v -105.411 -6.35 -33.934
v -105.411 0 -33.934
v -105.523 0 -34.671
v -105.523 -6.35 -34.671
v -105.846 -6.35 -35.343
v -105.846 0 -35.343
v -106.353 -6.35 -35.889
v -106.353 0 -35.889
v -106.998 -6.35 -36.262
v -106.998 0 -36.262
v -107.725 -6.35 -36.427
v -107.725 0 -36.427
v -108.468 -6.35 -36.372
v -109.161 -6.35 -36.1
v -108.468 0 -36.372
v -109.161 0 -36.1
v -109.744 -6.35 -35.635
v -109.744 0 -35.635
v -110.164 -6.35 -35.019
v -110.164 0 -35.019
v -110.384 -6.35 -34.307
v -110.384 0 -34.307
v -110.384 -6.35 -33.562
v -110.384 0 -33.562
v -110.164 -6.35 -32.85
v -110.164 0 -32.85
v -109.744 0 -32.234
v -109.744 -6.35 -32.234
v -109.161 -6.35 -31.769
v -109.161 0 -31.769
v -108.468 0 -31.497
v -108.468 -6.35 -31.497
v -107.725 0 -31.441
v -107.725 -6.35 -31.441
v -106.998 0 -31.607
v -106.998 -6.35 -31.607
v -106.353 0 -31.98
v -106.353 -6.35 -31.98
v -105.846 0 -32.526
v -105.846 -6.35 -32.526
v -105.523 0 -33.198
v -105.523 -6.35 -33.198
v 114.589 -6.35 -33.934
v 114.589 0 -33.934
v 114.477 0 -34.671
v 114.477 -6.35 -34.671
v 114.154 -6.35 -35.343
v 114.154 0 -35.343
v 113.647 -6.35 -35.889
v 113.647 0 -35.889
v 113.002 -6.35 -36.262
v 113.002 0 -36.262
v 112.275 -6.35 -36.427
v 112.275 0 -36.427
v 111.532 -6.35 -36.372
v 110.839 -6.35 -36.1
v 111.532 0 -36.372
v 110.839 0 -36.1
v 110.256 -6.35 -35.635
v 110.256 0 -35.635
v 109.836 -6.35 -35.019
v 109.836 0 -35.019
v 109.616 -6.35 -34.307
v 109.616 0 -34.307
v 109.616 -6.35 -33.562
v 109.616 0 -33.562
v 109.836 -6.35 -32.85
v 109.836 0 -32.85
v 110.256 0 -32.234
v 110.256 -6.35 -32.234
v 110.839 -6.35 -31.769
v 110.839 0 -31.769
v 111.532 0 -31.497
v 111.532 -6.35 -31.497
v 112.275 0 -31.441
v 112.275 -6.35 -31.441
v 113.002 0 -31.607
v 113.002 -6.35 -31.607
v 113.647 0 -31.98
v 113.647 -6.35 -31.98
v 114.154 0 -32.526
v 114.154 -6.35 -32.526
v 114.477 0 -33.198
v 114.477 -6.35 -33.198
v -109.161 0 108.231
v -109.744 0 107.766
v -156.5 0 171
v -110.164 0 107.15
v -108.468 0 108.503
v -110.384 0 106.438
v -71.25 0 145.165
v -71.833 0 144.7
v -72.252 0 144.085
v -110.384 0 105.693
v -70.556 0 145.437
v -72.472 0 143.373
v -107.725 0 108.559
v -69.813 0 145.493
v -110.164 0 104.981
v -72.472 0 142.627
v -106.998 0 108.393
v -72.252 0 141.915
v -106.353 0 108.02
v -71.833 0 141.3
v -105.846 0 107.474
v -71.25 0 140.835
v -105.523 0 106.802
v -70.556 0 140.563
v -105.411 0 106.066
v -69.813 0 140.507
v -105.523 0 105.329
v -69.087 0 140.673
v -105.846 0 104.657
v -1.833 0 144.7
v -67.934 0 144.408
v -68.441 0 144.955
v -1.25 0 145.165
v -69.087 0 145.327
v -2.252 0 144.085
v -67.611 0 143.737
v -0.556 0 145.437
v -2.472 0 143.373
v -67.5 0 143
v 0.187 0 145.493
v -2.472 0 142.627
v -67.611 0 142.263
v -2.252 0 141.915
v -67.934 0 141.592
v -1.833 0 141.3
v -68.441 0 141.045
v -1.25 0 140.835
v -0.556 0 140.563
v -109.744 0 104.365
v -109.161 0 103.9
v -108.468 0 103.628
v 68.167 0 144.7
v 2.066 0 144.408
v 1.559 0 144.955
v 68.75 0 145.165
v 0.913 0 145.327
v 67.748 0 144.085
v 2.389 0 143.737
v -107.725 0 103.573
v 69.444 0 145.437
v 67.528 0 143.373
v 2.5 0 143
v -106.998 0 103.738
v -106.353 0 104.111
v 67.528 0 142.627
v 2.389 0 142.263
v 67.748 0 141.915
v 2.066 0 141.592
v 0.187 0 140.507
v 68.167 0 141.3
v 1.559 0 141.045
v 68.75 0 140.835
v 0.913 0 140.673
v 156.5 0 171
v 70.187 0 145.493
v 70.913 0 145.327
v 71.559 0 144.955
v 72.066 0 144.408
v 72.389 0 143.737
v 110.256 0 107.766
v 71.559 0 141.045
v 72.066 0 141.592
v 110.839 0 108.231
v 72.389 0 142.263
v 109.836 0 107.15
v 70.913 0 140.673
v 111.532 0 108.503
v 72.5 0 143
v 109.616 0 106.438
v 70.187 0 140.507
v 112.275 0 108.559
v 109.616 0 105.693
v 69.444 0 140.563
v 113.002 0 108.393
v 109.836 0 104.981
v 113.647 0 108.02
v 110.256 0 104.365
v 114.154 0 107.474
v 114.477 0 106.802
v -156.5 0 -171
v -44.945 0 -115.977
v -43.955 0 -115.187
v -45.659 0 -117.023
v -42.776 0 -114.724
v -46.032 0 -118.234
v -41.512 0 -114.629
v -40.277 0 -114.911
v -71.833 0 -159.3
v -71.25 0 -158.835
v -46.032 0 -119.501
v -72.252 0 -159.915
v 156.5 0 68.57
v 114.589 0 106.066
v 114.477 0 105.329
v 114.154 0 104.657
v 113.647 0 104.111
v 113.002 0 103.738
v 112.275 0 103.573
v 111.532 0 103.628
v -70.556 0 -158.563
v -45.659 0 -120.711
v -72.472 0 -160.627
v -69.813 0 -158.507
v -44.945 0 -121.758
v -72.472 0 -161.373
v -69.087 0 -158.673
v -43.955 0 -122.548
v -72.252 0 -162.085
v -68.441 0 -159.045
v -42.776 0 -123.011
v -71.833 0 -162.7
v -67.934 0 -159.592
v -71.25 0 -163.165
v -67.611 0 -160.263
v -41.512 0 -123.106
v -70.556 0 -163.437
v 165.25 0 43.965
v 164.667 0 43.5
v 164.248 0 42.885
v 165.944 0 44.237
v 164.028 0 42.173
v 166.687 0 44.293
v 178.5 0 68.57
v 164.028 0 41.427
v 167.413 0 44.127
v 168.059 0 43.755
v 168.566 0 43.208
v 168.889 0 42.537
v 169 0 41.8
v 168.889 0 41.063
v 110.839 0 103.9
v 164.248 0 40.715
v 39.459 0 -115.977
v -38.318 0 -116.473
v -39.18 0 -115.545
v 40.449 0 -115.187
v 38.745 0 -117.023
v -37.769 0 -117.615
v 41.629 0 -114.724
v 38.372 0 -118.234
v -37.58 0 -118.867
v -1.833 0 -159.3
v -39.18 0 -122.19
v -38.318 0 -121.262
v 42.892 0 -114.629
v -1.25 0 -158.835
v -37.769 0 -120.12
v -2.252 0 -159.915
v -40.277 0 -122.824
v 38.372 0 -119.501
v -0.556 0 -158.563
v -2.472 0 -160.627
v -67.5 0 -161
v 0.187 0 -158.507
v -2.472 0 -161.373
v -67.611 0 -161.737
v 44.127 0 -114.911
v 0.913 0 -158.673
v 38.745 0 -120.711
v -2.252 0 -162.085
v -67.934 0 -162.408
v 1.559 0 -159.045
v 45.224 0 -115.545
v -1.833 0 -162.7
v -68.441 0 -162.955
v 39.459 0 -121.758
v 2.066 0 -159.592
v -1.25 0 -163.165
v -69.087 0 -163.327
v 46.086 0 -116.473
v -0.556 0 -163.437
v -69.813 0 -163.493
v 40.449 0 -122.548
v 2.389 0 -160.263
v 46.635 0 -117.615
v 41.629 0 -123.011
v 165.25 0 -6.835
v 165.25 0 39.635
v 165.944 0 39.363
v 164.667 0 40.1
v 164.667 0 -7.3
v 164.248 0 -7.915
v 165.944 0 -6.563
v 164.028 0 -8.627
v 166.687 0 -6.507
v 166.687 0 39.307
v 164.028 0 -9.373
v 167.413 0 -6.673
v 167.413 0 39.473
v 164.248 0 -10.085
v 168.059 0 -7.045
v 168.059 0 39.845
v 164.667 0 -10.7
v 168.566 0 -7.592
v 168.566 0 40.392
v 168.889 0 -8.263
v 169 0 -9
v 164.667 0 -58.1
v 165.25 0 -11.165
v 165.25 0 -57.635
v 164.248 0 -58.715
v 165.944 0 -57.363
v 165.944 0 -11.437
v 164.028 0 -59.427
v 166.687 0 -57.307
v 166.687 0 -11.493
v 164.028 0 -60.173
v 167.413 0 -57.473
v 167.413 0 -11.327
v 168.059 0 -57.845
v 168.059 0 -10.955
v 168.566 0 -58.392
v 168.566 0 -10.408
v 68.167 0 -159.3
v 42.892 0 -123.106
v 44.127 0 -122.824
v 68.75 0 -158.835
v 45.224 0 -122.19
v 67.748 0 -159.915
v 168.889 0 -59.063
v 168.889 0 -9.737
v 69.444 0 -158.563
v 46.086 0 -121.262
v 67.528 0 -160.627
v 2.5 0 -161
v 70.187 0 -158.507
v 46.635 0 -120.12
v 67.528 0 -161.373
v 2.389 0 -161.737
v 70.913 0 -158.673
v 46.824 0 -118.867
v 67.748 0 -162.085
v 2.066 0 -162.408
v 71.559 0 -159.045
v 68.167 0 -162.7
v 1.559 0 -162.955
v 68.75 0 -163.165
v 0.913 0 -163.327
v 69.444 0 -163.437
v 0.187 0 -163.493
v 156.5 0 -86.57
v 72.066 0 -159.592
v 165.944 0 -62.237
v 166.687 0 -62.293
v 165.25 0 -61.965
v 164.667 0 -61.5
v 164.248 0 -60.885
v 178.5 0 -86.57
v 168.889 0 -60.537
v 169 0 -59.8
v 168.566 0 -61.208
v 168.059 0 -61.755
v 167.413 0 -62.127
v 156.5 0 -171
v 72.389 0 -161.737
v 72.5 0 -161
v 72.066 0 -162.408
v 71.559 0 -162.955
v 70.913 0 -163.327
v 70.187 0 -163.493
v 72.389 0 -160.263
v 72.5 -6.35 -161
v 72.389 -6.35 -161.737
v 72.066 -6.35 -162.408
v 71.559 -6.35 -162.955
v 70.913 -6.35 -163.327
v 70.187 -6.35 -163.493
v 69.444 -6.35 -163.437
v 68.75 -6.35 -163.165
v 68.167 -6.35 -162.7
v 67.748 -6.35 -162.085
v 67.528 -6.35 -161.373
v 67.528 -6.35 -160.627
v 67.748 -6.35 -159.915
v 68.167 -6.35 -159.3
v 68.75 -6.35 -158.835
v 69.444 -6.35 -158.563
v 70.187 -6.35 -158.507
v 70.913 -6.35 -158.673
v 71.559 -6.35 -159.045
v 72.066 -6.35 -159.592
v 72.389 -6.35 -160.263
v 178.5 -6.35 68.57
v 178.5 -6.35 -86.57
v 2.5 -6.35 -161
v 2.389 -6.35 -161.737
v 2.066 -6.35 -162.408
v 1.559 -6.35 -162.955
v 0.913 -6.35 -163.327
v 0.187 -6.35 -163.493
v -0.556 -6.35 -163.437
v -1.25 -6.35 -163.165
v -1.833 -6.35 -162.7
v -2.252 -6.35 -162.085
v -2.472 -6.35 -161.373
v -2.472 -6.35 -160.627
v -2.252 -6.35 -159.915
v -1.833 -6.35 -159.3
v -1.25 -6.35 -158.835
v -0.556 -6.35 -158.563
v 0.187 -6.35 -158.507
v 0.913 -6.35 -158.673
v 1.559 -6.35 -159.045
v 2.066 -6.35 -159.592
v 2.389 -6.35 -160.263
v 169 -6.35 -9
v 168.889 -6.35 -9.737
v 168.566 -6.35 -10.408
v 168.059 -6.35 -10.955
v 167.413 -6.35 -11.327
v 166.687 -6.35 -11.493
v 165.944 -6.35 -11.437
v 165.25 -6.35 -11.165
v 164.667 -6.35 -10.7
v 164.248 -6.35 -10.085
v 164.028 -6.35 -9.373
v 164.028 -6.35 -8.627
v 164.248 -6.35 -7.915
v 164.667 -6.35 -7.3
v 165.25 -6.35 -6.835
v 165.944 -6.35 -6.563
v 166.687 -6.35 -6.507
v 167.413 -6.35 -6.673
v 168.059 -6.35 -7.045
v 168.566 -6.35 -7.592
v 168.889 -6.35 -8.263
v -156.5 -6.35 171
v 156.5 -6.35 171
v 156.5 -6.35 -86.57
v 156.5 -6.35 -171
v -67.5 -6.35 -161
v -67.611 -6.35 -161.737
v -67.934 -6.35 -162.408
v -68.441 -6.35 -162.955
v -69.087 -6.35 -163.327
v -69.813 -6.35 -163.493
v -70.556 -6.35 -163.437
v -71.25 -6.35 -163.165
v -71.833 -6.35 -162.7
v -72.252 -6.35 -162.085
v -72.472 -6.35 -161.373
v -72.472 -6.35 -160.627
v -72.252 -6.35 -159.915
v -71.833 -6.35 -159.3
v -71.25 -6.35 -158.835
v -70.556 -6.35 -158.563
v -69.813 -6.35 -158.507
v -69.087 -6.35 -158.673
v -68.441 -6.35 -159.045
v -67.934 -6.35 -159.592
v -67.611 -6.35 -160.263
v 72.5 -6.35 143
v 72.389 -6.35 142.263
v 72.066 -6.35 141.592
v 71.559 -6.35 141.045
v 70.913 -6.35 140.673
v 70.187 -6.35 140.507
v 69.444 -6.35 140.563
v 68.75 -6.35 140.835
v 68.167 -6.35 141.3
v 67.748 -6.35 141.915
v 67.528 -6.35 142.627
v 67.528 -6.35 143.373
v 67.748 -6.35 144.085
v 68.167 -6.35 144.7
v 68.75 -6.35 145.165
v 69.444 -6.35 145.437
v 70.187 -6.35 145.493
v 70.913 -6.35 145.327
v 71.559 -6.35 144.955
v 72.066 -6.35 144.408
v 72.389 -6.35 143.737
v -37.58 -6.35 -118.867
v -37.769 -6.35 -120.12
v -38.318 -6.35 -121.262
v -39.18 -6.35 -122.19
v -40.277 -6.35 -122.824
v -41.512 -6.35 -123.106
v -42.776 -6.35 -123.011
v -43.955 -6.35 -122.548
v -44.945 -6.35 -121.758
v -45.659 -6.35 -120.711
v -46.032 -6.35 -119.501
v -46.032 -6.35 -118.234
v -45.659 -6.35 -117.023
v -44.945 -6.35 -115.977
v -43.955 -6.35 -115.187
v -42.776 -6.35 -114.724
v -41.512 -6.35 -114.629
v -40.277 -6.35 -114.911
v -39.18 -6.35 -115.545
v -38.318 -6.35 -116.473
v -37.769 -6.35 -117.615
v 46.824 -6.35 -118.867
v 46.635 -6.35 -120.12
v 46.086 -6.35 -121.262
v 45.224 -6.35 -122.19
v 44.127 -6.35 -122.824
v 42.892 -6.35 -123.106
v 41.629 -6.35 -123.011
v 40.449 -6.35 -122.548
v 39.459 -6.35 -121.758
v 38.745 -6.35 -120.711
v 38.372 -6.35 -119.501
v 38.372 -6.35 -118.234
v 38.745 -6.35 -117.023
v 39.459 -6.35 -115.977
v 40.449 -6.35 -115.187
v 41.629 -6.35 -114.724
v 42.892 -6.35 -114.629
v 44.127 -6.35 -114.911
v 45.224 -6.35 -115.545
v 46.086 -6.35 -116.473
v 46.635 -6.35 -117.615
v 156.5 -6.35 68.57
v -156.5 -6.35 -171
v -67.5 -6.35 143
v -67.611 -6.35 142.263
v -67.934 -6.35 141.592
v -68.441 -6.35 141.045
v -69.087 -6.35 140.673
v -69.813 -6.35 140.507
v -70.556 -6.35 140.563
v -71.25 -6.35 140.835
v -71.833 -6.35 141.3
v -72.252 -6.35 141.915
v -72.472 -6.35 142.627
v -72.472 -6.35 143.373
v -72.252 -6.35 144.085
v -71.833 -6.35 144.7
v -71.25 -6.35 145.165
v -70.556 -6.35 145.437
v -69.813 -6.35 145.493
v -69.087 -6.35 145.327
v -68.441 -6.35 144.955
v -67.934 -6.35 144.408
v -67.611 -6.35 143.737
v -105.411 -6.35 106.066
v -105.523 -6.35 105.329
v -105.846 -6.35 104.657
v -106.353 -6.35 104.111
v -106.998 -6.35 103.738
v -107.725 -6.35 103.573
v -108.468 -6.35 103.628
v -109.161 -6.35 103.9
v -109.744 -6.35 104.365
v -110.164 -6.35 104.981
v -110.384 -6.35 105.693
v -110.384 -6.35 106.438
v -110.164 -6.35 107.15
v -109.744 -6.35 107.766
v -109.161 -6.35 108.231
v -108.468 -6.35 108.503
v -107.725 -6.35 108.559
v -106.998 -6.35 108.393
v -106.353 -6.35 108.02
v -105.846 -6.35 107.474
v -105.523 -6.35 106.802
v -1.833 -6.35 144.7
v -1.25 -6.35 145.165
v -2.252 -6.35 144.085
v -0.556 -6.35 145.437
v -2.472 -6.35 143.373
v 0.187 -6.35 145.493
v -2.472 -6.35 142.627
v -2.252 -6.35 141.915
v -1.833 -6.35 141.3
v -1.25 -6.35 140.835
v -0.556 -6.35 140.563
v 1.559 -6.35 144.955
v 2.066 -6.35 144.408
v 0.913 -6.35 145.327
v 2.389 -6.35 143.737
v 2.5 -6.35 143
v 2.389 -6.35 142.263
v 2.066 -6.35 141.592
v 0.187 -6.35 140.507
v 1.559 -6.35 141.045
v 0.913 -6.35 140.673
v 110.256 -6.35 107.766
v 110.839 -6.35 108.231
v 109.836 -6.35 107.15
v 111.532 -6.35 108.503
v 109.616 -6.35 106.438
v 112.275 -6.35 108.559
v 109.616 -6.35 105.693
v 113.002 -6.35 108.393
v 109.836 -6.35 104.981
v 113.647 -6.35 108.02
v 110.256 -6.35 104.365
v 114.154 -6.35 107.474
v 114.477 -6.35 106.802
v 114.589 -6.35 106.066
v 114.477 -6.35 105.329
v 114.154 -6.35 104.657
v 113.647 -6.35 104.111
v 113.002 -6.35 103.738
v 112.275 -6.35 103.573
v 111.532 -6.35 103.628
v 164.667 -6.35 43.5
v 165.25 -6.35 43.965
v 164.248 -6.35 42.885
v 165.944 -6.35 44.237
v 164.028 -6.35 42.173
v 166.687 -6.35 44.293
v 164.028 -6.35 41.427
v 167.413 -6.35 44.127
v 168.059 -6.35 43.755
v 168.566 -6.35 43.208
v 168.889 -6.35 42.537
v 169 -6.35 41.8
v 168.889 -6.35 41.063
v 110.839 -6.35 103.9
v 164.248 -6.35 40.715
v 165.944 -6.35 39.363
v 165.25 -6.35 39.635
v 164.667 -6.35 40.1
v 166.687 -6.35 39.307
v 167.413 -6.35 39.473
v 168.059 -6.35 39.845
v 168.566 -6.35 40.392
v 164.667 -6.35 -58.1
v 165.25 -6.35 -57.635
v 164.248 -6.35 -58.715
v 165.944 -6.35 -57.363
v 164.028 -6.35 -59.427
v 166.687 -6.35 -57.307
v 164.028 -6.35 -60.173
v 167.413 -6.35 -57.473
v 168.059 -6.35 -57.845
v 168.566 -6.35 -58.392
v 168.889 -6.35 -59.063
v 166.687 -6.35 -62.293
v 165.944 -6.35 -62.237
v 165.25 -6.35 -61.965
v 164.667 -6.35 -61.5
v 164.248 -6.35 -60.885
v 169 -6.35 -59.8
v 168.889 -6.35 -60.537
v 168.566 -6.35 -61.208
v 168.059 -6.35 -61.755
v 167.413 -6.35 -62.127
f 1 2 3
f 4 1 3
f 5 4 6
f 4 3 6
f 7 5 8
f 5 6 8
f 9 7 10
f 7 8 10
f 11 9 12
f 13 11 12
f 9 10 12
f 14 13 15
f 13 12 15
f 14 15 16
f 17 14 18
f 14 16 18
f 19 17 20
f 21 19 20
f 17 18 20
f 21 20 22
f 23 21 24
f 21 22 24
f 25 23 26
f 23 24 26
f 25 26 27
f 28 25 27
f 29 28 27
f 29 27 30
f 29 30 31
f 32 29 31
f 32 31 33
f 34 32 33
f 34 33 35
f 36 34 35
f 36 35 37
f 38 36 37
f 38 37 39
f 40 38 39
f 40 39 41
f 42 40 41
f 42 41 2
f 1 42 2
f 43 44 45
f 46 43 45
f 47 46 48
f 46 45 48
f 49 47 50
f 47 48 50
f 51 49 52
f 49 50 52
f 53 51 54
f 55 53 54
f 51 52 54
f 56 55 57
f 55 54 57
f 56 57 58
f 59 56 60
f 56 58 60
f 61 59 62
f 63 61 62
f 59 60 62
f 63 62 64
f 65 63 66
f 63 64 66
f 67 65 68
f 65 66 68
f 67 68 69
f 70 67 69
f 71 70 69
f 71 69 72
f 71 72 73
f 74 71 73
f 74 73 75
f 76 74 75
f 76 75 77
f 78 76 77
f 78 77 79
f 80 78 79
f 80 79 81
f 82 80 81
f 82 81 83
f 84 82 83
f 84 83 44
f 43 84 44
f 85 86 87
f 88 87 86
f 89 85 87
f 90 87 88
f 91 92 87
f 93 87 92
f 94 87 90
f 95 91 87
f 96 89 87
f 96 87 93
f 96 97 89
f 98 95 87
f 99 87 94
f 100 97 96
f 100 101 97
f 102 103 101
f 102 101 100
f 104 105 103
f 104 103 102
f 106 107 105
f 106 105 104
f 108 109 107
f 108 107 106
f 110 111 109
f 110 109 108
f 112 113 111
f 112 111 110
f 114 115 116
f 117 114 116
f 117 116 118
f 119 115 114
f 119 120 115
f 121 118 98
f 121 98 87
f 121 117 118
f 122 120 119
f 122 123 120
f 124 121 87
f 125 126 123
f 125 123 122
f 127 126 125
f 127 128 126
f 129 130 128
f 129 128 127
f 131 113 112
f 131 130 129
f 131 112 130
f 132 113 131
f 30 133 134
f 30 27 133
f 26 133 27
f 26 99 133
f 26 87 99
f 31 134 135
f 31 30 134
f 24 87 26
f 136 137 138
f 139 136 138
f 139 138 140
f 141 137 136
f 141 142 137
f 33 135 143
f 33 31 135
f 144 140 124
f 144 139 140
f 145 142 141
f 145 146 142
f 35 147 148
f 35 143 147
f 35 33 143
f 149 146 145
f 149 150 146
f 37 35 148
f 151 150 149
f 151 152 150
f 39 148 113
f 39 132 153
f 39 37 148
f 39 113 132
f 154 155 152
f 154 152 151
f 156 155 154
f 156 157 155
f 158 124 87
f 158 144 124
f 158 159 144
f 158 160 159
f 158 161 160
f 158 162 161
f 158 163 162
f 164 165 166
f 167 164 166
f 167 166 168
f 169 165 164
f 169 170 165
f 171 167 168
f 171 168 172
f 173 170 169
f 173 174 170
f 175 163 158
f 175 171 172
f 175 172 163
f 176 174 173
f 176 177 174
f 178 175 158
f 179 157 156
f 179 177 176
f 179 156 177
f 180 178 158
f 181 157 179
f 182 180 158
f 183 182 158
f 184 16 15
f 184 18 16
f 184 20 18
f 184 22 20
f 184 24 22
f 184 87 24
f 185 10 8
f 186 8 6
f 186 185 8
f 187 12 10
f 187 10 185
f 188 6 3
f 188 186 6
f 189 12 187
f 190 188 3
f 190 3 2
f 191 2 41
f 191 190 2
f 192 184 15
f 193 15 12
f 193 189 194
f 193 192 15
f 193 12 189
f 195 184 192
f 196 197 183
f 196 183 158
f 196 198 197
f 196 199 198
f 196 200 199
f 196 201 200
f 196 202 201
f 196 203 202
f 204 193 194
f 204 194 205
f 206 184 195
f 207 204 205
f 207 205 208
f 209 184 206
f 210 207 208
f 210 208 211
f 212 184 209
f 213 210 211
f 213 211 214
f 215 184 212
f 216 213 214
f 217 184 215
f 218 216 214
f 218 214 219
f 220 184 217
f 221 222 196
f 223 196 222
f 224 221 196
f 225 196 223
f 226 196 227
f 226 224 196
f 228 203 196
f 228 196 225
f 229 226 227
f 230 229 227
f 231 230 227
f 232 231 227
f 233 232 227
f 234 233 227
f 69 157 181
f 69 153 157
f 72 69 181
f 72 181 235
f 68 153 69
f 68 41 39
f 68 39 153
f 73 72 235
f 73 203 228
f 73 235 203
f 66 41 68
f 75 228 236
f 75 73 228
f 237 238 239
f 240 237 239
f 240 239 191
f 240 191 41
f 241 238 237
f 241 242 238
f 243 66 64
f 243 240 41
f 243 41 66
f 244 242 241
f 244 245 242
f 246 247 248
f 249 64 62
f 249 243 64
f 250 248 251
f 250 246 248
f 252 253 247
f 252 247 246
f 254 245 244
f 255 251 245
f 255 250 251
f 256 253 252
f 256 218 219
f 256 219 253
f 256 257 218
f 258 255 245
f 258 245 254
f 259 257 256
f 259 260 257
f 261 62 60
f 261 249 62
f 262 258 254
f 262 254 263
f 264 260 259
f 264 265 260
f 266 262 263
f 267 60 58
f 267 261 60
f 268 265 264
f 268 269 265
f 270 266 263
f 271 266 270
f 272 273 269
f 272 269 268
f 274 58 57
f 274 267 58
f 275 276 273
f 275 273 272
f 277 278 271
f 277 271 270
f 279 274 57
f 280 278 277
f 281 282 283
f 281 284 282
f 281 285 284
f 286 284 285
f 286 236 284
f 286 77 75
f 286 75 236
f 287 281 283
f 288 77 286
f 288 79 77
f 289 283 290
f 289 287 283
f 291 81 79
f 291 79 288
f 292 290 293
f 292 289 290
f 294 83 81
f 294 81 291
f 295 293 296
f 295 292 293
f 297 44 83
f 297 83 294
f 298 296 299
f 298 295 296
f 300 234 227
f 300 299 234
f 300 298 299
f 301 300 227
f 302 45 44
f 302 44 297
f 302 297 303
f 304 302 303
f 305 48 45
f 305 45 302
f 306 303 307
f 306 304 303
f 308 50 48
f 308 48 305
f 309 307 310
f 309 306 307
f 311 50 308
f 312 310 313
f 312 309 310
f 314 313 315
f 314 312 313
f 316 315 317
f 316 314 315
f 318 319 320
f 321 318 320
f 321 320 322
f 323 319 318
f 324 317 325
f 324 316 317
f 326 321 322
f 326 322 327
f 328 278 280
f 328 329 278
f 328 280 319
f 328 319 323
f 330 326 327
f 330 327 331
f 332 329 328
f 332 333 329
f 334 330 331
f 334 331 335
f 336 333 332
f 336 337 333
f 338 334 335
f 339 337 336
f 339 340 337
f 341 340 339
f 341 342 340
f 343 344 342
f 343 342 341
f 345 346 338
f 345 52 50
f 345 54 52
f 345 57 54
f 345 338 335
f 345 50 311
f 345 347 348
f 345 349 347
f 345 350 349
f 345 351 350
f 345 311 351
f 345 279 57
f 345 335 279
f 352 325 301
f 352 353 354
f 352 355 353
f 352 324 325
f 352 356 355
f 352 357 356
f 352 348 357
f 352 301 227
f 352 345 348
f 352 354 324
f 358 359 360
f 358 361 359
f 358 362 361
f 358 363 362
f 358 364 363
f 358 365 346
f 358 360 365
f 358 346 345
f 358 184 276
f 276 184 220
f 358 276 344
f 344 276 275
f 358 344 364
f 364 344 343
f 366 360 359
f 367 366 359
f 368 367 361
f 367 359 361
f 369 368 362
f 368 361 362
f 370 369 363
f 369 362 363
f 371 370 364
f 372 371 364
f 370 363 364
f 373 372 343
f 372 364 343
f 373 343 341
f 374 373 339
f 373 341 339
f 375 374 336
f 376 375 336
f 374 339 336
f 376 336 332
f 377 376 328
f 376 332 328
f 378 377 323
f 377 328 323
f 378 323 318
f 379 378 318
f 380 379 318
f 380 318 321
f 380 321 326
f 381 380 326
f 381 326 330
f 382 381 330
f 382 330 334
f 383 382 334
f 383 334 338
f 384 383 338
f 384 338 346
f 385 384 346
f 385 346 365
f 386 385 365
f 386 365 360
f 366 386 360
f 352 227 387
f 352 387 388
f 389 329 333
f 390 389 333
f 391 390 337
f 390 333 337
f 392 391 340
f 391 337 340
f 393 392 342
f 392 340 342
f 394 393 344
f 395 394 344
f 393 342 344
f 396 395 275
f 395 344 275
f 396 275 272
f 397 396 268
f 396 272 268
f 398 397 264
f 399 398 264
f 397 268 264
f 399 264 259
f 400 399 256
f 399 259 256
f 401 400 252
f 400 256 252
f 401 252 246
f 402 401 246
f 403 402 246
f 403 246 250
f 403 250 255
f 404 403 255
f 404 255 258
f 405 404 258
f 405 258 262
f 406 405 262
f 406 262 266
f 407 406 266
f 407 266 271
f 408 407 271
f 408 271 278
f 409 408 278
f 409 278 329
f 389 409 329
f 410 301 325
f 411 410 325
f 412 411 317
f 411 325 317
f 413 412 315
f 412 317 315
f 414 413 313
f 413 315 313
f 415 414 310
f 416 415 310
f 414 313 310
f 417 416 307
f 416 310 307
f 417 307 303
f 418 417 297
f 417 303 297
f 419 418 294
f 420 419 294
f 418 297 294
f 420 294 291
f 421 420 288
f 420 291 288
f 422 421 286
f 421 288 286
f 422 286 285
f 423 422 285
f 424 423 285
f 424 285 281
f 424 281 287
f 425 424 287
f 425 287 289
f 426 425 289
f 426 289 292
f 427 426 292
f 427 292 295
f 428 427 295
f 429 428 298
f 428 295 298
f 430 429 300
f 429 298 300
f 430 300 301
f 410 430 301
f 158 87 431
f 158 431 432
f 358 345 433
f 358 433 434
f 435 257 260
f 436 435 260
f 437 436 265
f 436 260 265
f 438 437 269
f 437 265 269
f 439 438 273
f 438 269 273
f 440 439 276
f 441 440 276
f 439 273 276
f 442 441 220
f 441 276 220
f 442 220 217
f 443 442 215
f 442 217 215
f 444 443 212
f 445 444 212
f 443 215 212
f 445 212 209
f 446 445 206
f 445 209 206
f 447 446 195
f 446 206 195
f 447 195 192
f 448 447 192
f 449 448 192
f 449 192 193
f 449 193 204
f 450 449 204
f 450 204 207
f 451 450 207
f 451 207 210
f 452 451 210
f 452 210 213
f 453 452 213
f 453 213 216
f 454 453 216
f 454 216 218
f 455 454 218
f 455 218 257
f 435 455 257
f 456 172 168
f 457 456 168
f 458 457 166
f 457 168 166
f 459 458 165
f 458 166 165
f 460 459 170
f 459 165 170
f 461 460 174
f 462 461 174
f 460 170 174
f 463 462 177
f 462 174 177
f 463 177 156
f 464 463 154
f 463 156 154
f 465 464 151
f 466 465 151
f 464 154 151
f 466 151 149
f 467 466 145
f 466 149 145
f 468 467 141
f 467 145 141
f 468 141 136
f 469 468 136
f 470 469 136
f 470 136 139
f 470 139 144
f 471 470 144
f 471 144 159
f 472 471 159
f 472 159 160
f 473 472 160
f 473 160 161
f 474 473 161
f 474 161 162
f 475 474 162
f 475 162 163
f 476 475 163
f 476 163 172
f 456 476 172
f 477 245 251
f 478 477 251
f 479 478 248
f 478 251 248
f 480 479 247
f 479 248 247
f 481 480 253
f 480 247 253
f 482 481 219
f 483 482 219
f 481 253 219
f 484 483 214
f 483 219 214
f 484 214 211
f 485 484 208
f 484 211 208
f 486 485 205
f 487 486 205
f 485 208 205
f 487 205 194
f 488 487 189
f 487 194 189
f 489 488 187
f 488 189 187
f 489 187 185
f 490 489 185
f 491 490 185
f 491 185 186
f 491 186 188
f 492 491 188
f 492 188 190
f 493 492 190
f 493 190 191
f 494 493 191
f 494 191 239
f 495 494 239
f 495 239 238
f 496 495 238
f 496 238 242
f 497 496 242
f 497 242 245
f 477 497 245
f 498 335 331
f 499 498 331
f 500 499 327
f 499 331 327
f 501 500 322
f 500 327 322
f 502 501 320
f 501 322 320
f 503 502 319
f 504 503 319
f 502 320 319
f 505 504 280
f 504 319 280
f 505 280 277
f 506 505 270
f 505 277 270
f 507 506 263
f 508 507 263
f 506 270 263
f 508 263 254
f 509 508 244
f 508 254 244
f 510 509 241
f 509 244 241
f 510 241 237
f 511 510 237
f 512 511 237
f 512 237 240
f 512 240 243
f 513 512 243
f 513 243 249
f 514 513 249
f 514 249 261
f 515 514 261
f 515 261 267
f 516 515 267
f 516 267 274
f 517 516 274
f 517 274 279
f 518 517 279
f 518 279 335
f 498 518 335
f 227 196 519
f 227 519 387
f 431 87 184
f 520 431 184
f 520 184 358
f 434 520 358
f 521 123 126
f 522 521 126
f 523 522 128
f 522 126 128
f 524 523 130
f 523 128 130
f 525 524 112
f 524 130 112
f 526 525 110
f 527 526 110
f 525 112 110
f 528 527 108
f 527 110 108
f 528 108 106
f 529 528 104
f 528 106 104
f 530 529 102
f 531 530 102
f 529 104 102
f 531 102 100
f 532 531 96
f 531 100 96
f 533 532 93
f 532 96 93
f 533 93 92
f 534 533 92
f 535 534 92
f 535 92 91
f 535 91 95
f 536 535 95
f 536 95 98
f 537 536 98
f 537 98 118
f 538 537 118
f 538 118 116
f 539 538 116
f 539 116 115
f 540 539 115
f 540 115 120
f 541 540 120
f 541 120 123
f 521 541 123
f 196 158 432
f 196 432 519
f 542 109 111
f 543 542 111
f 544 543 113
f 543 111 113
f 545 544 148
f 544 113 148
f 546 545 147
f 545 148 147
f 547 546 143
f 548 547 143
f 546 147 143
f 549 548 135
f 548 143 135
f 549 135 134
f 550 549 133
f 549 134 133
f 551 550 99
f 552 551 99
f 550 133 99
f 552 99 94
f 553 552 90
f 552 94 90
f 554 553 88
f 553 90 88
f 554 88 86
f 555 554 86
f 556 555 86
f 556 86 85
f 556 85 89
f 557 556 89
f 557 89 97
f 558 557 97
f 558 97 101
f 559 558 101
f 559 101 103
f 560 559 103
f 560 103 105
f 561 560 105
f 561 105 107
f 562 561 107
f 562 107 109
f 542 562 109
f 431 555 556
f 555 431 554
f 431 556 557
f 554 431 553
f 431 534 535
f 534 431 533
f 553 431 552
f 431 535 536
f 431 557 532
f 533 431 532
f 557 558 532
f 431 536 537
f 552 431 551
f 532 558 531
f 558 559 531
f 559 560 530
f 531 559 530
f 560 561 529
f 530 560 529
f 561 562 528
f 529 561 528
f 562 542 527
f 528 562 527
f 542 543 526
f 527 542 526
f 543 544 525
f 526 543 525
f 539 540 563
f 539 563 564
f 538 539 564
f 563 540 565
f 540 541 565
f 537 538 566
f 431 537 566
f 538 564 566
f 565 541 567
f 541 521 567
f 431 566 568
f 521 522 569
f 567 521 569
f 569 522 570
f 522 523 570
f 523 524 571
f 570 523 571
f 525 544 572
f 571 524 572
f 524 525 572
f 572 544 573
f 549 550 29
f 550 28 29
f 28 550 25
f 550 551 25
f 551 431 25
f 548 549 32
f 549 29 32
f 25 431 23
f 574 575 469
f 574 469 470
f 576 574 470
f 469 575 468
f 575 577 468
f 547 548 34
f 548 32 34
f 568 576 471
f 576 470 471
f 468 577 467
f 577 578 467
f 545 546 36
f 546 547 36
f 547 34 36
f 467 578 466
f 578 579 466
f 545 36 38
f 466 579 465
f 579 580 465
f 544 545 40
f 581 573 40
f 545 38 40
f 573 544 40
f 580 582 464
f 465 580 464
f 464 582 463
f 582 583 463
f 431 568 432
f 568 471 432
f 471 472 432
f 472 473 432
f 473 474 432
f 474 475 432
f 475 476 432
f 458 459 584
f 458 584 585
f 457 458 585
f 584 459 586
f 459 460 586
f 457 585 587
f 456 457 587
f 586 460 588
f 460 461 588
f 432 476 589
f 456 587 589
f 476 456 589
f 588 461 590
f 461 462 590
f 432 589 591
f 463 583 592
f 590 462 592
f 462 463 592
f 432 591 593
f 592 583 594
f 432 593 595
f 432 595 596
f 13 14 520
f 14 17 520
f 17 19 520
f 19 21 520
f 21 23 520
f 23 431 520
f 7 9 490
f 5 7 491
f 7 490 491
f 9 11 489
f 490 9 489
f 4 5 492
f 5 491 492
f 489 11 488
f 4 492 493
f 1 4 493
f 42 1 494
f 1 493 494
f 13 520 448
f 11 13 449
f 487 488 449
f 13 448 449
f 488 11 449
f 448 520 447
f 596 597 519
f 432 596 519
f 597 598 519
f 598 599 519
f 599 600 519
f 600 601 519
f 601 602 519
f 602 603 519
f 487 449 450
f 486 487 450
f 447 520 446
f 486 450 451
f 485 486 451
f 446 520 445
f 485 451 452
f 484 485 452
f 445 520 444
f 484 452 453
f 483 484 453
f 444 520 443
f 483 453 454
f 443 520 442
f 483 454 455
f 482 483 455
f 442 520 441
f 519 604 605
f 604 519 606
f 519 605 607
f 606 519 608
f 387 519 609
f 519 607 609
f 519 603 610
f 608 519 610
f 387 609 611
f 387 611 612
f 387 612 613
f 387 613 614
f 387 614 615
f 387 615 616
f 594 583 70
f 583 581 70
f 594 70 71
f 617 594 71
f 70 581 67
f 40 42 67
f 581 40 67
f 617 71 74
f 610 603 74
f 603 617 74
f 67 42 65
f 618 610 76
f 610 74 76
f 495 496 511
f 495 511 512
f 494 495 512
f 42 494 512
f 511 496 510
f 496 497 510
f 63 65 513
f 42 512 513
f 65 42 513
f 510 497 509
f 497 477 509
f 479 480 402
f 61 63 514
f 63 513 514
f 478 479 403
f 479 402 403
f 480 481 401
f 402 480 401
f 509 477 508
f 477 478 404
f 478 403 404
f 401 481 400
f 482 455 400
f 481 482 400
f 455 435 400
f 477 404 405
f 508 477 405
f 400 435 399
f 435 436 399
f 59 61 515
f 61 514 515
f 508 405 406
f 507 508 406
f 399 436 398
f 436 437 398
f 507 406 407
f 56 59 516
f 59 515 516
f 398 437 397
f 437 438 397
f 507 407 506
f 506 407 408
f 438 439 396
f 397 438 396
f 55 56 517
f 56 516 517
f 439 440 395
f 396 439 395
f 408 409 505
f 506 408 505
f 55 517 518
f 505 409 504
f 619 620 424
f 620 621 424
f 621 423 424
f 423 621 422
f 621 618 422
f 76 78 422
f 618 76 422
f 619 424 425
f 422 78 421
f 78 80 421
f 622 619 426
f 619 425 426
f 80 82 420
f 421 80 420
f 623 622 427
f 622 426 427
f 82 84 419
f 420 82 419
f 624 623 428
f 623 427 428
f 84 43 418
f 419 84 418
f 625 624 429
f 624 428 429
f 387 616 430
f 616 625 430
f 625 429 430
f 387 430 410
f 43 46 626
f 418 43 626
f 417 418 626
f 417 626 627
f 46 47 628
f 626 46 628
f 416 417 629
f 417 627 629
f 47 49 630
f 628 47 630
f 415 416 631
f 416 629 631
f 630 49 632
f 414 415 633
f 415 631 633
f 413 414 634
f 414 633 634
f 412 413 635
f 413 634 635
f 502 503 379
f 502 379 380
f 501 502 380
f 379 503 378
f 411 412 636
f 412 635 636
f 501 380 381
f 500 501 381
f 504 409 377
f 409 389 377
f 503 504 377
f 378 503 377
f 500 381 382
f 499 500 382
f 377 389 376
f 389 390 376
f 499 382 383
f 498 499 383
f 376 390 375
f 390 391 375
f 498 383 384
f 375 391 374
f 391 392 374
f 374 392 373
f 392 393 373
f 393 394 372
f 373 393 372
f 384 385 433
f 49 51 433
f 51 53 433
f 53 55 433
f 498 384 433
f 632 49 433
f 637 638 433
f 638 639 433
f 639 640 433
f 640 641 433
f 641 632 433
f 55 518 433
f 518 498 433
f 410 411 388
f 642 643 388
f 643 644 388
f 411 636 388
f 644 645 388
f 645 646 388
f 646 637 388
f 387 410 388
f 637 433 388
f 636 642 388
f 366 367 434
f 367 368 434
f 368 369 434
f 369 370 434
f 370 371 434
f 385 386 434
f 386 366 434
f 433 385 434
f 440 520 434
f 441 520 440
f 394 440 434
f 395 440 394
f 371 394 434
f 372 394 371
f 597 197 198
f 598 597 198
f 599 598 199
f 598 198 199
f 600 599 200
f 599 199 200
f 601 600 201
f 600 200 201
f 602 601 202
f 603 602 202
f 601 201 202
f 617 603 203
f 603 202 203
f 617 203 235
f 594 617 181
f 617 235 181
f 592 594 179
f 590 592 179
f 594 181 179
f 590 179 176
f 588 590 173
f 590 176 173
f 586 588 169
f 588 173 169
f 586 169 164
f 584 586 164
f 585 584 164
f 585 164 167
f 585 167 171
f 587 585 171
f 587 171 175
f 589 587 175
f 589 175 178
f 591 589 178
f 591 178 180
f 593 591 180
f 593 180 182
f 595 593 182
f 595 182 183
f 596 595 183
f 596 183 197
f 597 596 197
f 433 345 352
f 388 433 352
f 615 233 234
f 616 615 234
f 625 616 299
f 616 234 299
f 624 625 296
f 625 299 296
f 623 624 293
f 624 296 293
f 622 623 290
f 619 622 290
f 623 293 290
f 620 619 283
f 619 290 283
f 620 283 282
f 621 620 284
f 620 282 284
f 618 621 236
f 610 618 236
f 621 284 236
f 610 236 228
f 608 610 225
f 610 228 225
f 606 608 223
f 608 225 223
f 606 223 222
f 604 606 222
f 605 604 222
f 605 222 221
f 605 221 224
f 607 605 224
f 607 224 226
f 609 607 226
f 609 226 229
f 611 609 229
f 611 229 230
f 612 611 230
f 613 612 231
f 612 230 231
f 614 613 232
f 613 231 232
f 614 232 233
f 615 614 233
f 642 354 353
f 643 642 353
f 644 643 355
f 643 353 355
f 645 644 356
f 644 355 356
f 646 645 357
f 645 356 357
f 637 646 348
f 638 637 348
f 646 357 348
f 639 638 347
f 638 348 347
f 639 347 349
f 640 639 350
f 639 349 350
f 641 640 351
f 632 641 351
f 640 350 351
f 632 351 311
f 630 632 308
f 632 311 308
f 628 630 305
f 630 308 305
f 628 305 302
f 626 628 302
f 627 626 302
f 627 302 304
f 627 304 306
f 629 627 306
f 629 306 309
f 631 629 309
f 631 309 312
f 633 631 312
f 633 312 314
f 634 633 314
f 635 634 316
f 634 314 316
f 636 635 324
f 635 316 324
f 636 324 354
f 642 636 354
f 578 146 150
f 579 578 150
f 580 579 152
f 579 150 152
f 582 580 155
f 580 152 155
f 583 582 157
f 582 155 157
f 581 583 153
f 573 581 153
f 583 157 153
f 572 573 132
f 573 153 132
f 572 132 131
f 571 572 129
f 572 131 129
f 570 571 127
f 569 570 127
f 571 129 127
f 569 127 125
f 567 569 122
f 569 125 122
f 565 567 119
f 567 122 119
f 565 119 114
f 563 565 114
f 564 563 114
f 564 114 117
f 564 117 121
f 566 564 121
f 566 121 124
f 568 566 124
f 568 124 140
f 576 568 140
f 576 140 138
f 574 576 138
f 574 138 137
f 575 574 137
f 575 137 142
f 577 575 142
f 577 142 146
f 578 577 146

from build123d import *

# Parameters (mm, degrees)
SKETCH1_W           = 313
SKETCH1_H           = 342
BOSS_EXTRUDE1_DEPTH = 6.35
SKETCH3_W           = 22
SKETCH3_H           = 155.14040353
SKETCH3_R           = 2.5
BOSS_EXTRUDE2_DEPTH = 6.35
SKETCH2_R           = 2.5
CUT_EXTRUDE1_DEPTH  = 7.35
SKETCH4_R           = 4.25
SKETCH4_R_2         = 2.5
CUT_EXTRUDE2_DEPTH  = 7.35


with BuildPart() as part:
    # Sketch1 → Boss-Extrude1 (new body)
    with BuildSketch(Plane(origin=(0, 0, 0), x_dir=(1, 0, 0), z_dir=(0, 1, 0))):
        Rectangle(SKETCH1_W, SKETCH1_H)
    extrude(amount=-BOSS_EXTRUDE1_DEPTH)

    # Sketch3 → Boss-Extrude2 (add)
    with BuildSketch(Plane(origin=(0, 0, 0), x_dir=(1, 0, 0), z_dir=(0, 1, 0))):
        with Locations((167.5, 9)):
            Rectangle(SKETCH3_W, SKETCH3_H)
        with Locations((166.5, 9)):
            Circle(SKETCH3_R, mode=Mode.SUBTRACT)
        with Locations((166.5, -41.8)):
            Circle(SKETCH3_R, mode=Mode.SUBTRACT)
        with Locations((166.5, 59.8)):
            Circle(SKETCH3_R, mode=Mode.SUBTRACT)
    extrude(amount=-BOSS_EXTRUDE2_DEPTH)

    # Sketch2 → Cut-Extrude1 (cut, through all)
    with BuildSketch(Plane(origin=(0, 0, 0), x_dir=(1, 0, 0), z_dir=(0, 1, 0))):
        with Locations((0, -143)):
            Circle(SKETCH2_R)
        with Locations((-70, -143)):
            Circle(SKETCH2_R)
        with Locations((70, -143)):
            Circle(SKETCH2_R)
        with Locations((-70, 161)):
            Circle(SKETCH2_R)
        with Locations((0, 161)):
            Circle(SKETCH2_R)
        with Locations((70, 161)):
            Circle(SKETCH2_R)
    extrude(amount=-CUT_EXTRUDE1_DEPTH, mode=Mode.SUBTRACT)

    # Sketch4 → Cut-Extrude2 (cut, through all)
    with BuildSketch(Plane(origin=(0, 0, 0), x_dir=(1, 0, 0), z_dir=(0, 1, 0))):
        with Locations((42.574237453, 118.86741573)):
            Circle(SKETCH4_R)
        with Locations((-41.829962547, 118.86741573)):
            Circle(SKETCH4_R)
        with Locations((-107.911484214, -106.065530058)):
            Circle(SKETCH4_R_2)
        with Locations((-107.911484214, 33.934469942)):
            Circle(SKETCH4_R_2)
        with Locations((112.088515786, 33.934469942)):
            Circle(SKETCH4_R_2)
        with Locations((112.088515786, -106.065530058)):
            Circle(SKETCH4_R_2)
    extrude(amount=-CUT_EXTRUDE2_DEPTH, mode=Mode.SUBTRACT)


solid = part.part
